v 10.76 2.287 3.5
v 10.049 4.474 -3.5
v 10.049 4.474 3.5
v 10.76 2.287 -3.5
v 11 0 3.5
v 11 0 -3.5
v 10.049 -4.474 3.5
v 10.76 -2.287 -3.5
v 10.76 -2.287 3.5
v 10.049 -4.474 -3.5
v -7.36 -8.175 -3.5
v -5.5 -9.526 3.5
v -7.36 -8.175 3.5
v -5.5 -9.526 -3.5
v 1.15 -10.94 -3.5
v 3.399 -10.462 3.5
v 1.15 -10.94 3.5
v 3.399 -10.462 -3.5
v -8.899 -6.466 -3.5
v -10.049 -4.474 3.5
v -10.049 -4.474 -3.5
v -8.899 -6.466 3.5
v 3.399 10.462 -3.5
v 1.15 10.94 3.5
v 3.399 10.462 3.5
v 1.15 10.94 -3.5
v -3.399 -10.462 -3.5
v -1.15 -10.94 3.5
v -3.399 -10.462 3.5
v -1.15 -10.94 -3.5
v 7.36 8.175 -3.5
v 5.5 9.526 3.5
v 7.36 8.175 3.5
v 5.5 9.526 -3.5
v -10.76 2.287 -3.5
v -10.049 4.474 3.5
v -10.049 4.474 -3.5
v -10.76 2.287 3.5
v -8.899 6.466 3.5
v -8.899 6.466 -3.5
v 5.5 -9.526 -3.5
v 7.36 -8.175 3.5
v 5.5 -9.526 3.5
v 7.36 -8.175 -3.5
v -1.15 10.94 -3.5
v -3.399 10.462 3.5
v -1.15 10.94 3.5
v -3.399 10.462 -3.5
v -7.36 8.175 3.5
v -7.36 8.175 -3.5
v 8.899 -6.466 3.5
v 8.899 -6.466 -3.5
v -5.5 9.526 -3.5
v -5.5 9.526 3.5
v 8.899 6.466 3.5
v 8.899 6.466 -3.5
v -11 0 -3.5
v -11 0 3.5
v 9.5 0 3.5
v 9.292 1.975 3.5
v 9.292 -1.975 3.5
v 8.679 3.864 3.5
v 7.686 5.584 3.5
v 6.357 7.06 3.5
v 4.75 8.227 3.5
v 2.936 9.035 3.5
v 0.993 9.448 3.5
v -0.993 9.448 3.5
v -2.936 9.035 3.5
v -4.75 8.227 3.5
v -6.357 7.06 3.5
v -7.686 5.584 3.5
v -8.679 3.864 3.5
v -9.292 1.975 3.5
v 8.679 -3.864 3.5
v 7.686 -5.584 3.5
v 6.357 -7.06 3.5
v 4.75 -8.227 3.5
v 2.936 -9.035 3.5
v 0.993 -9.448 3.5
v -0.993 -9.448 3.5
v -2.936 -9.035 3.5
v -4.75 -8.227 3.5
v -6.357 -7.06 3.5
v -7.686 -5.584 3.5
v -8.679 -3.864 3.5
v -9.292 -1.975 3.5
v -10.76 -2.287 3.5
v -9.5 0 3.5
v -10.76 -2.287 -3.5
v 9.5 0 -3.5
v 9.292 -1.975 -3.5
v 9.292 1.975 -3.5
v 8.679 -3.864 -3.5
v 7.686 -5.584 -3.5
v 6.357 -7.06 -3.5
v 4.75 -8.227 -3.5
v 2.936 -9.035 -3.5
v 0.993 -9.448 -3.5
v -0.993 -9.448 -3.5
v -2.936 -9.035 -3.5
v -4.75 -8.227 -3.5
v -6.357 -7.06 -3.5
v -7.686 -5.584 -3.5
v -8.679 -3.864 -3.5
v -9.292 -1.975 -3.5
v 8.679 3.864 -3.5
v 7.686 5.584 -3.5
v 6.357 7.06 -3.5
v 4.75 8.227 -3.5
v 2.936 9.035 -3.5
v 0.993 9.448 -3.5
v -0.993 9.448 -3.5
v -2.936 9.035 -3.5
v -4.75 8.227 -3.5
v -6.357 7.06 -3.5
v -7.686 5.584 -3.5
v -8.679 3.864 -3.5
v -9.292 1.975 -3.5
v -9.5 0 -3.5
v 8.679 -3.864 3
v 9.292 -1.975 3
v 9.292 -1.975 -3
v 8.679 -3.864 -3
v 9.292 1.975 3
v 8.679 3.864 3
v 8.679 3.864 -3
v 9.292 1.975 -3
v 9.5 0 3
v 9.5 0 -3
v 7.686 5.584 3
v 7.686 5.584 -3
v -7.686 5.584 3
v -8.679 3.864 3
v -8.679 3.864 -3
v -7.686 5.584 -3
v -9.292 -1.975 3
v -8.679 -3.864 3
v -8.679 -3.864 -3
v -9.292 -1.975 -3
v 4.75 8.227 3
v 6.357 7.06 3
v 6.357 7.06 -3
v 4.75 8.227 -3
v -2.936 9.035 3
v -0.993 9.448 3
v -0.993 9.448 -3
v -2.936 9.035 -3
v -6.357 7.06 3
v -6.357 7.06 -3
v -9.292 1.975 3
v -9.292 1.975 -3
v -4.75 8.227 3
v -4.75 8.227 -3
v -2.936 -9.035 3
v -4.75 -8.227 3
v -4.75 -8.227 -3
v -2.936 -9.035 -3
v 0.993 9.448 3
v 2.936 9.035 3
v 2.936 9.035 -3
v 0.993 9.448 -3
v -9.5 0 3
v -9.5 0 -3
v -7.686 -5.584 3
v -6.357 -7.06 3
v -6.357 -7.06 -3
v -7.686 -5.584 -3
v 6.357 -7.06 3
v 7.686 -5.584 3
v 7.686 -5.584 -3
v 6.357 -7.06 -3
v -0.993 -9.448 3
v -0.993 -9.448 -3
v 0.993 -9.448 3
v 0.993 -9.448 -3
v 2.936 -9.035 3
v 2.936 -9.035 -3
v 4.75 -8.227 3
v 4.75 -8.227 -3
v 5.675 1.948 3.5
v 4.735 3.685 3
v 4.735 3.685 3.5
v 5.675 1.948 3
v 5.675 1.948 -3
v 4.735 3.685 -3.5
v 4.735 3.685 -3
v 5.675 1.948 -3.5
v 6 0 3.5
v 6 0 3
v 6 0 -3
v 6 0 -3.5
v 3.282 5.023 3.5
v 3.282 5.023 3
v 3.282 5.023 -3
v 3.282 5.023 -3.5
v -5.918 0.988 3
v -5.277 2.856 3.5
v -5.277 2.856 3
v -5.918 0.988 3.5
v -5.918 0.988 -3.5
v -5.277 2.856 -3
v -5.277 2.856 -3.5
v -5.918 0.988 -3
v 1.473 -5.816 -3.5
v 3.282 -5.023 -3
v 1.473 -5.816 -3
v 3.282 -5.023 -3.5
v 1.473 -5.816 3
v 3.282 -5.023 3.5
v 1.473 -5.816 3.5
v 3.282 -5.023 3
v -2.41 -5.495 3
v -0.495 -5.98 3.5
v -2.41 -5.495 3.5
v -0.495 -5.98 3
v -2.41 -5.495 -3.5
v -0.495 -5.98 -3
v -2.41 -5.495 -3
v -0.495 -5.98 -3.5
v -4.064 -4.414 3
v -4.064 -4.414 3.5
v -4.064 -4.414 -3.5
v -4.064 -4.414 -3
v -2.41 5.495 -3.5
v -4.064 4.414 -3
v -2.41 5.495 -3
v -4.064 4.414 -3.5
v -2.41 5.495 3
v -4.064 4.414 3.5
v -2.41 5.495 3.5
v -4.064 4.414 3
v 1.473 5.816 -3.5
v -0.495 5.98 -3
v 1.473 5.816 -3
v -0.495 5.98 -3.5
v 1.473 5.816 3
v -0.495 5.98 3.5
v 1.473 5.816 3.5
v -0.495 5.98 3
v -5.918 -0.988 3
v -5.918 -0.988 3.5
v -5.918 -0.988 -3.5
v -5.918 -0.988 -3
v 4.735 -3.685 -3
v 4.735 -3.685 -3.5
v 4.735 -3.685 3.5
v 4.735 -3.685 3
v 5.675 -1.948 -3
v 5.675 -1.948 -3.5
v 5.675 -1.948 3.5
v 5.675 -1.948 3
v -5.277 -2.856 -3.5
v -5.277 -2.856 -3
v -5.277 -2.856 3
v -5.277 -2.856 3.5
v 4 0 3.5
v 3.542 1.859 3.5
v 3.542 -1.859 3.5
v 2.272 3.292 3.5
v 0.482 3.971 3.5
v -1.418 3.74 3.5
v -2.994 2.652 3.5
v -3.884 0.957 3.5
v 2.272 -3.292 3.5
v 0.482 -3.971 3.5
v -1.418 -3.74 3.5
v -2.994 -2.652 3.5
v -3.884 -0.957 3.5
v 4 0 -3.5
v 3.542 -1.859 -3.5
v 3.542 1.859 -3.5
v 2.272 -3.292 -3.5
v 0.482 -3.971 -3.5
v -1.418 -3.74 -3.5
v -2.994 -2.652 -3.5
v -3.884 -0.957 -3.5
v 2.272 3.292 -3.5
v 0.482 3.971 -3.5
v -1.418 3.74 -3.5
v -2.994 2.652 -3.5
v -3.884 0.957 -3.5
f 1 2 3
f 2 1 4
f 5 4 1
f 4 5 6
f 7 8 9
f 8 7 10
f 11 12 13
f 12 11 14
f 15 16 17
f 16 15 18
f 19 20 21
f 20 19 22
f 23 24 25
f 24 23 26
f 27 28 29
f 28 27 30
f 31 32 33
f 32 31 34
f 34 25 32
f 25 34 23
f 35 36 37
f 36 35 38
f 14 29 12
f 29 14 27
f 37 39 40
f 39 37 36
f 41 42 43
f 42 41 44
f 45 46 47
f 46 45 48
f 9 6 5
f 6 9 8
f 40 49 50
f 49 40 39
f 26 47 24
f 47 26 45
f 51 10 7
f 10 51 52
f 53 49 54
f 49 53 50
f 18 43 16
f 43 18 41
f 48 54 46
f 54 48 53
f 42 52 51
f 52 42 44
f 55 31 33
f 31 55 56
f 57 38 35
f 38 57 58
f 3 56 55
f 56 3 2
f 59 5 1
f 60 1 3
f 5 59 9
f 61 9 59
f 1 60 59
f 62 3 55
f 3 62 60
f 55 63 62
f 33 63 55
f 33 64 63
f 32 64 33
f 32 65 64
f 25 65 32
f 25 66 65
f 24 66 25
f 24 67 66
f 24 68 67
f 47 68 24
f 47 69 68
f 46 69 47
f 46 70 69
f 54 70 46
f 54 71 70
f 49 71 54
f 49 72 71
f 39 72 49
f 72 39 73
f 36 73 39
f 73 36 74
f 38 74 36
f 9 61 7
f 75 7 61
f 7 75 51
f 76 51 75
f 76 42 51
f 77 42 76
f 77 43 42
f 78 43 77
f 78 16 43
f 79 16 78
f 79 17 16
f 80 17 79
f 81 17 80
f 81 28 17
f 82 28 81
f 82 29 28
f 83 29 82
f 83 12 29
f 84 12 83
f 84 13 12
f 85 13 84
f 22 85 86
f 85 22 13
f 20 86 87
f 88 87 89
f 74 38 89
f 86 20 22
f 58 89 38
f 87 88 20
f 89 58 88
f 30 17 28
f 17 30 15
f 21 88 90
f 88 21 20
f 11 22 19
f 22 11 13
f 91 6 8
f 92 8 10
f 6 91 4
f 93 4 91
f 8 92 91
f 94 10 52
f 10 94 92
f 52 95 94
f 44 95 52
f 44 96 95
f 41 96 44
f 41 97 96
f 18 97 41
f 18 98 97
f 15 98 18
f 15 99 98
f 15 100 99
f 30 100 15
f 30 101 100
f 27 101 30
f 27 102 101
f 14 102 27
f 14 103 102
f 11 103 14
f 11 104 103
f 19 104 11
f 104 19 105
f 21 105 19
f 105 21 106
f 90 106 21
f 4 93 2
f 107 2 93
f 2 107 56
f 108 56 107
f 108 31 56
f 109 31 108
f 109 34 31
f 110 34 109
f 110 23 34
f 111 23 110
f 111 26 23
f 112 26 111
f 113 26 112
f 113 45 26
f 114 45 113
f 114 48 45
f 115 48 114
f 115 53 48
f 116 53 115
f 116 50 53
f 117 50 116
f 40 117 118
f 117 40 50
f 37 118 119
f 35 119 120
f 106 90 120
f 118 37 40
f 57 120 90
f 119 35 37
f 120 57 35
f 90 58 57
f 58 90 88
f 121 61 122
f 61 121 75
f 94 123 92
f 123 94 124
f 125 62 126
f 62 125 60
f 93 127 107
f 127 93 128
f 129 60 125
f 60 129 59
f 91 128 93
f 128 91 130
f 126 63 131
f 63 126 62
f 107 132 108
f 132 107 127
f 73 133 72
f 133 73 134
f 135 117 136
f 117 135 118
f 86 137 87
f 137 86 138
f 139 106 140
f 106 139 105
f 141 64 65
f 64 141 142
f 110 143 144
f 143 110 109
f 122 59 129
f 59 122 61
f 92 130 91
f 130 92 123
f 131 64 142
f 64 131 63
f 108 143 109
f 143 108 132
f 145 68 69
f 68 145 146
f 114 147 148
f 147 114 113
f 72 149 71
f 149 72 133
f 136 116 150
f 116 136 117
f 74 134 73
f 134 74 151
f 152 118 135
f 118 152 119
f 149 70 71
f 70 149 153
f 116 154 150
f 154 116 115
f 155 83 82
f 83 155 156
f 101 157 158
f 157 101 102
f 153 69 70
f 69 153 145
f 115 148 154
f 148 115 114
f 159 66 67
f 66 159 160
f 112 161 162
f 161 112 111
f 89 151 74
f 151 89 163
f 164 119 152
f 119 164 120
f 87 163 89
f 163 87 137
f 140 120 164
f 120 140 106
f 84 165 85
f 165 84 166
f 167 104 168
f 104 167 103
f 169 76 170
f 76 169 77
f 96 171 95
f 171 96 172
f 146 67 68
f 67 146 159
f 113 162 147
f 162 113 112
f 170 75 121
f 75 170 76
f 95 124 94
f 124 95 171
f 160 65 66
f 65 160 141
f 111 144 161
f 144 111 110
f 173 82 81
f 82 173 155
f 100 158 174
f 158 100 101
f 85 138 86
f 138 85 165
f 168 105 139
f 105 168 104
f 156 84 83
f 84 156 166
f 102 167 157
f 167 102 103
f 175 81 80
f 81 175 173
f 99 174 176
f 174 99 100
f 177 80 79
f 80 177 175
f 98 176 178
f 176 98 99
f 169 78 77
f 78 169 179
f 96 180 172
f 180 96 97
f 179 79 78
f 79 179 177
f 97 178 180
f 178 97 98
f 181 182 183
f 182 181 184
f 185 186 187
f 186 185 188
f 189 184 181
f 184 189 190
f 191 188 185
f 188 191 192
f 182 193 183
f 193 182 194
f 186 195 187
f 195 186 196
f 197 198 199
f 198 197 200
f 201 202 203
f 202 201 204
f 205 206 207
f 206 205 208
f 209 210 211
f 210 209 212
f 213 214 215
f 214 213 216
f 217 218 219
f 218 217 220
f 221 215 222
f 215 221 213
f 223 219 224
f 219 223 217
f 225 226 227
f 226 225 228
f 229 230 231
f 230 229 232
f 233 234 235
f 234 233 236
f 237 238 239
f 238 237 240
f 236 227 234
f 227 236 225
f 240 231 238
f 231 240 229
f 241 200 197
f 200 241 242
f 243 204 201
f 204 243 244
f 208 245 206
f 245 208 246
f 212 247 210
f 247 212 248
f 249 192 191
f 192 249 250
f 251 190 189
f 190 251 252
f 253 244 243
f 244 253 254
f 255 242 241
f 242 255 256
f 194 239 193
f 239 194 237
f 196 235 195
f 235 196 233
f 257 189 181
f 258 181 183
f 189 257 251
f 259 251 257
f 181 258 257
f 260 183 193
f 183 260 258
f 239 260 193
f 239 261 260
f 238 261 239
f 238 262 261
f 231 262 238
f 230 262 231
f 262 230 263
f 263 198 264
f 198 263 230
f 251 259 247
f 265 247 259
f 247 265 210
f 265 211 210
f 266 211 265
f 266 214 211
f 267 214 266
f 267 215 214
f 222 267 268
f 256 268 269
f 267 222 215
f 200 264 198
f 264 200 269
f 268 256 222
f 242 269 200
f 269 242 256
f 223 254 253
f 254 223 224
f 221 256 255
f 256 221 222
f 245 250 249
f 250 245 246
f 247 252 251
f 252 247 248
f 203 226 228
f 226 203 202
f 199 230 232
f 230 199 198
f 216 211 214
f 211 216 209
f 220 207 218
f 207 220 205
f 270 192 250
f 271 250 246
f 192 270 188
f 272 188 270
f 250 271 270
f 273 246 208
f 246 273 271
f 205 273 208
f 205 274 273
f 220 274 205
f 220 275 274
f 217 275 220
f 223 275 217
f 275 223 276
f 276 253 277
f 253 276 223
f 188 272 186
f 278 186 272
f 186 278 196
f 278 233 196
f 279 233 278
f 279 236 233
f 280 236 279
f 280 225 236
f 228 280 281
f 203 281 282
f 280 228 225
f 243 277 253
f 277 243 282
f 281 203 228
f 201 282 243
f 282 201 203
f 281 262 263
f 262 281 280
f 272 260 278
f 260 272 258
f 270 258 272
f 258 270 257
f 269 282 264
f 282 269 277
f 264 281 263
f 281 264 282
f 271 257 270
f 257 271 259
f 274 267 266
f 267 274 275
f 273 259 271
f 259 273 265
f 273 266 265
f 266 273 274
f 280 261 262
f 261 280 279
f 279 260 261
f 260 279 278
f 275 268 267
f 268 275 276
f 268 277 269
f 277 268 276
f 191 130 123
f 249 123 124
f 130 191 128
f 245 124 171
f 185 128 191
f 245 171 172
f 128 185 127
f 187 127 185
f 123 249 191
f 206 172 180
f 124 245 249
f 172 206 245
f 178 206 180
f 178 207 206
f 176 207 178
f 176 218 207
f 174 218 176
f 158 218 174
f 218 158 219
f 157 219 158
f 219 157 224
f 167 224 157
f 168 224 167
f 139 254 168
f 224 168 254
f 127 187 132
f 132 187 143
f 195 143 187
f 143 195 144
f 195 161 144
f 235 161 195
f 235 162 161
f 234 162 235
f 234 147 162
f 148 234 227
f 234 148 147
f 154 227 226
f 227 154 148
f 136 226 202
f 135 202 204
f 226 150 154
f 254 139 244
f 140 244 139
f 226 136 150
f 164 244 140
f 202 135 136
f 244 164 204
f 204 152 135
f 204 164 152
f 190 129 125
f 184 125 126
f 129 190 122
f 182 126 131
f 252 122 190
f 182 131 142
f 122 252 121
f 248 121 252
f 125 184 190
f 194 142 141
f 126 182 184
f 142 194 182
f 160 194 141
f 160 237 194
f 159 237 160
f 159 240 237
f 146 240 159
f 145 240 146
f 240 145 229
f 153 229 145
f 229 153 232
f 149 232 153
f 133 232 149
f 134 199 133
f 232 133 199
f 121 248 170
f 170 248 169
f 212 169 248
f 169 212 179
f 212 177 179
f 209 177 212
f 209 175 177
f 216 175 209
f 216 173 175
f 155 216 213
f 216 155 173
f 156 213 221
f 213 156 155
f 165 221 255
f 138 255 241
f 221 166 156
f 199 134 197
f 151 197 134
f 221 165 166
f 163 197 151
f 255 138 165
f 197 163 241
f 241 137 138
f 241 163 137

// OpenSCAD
module profil20x20(l){
    color("Gainsboro",1)
    linear_extrude(height=l,center=true,convexity=10,twist=0){
        difference(){
            square(20,center=true);
            square(16,center=true);
        }
    }
}

module lozisko608zz(){
    color("Silver")
        difference(){
            cylinder(d=22,h=7,center=true);
            cylinder(d=19,h=8,center=true);
        }
    color("Silver")
        difference(){
            cylinder(d=12,h=7,center=true);
            cylinder(d=8,h=8,center=true);
        }
    color("DarkKhaki")
        difference(){
            cylinder(d=19,h=6,center=true);
            cylinder(d=12,h=8,center=true);
        }
}        

lozisko608zz();
/*
rotate([90,0,0])
    profil20x20(300);
*/
